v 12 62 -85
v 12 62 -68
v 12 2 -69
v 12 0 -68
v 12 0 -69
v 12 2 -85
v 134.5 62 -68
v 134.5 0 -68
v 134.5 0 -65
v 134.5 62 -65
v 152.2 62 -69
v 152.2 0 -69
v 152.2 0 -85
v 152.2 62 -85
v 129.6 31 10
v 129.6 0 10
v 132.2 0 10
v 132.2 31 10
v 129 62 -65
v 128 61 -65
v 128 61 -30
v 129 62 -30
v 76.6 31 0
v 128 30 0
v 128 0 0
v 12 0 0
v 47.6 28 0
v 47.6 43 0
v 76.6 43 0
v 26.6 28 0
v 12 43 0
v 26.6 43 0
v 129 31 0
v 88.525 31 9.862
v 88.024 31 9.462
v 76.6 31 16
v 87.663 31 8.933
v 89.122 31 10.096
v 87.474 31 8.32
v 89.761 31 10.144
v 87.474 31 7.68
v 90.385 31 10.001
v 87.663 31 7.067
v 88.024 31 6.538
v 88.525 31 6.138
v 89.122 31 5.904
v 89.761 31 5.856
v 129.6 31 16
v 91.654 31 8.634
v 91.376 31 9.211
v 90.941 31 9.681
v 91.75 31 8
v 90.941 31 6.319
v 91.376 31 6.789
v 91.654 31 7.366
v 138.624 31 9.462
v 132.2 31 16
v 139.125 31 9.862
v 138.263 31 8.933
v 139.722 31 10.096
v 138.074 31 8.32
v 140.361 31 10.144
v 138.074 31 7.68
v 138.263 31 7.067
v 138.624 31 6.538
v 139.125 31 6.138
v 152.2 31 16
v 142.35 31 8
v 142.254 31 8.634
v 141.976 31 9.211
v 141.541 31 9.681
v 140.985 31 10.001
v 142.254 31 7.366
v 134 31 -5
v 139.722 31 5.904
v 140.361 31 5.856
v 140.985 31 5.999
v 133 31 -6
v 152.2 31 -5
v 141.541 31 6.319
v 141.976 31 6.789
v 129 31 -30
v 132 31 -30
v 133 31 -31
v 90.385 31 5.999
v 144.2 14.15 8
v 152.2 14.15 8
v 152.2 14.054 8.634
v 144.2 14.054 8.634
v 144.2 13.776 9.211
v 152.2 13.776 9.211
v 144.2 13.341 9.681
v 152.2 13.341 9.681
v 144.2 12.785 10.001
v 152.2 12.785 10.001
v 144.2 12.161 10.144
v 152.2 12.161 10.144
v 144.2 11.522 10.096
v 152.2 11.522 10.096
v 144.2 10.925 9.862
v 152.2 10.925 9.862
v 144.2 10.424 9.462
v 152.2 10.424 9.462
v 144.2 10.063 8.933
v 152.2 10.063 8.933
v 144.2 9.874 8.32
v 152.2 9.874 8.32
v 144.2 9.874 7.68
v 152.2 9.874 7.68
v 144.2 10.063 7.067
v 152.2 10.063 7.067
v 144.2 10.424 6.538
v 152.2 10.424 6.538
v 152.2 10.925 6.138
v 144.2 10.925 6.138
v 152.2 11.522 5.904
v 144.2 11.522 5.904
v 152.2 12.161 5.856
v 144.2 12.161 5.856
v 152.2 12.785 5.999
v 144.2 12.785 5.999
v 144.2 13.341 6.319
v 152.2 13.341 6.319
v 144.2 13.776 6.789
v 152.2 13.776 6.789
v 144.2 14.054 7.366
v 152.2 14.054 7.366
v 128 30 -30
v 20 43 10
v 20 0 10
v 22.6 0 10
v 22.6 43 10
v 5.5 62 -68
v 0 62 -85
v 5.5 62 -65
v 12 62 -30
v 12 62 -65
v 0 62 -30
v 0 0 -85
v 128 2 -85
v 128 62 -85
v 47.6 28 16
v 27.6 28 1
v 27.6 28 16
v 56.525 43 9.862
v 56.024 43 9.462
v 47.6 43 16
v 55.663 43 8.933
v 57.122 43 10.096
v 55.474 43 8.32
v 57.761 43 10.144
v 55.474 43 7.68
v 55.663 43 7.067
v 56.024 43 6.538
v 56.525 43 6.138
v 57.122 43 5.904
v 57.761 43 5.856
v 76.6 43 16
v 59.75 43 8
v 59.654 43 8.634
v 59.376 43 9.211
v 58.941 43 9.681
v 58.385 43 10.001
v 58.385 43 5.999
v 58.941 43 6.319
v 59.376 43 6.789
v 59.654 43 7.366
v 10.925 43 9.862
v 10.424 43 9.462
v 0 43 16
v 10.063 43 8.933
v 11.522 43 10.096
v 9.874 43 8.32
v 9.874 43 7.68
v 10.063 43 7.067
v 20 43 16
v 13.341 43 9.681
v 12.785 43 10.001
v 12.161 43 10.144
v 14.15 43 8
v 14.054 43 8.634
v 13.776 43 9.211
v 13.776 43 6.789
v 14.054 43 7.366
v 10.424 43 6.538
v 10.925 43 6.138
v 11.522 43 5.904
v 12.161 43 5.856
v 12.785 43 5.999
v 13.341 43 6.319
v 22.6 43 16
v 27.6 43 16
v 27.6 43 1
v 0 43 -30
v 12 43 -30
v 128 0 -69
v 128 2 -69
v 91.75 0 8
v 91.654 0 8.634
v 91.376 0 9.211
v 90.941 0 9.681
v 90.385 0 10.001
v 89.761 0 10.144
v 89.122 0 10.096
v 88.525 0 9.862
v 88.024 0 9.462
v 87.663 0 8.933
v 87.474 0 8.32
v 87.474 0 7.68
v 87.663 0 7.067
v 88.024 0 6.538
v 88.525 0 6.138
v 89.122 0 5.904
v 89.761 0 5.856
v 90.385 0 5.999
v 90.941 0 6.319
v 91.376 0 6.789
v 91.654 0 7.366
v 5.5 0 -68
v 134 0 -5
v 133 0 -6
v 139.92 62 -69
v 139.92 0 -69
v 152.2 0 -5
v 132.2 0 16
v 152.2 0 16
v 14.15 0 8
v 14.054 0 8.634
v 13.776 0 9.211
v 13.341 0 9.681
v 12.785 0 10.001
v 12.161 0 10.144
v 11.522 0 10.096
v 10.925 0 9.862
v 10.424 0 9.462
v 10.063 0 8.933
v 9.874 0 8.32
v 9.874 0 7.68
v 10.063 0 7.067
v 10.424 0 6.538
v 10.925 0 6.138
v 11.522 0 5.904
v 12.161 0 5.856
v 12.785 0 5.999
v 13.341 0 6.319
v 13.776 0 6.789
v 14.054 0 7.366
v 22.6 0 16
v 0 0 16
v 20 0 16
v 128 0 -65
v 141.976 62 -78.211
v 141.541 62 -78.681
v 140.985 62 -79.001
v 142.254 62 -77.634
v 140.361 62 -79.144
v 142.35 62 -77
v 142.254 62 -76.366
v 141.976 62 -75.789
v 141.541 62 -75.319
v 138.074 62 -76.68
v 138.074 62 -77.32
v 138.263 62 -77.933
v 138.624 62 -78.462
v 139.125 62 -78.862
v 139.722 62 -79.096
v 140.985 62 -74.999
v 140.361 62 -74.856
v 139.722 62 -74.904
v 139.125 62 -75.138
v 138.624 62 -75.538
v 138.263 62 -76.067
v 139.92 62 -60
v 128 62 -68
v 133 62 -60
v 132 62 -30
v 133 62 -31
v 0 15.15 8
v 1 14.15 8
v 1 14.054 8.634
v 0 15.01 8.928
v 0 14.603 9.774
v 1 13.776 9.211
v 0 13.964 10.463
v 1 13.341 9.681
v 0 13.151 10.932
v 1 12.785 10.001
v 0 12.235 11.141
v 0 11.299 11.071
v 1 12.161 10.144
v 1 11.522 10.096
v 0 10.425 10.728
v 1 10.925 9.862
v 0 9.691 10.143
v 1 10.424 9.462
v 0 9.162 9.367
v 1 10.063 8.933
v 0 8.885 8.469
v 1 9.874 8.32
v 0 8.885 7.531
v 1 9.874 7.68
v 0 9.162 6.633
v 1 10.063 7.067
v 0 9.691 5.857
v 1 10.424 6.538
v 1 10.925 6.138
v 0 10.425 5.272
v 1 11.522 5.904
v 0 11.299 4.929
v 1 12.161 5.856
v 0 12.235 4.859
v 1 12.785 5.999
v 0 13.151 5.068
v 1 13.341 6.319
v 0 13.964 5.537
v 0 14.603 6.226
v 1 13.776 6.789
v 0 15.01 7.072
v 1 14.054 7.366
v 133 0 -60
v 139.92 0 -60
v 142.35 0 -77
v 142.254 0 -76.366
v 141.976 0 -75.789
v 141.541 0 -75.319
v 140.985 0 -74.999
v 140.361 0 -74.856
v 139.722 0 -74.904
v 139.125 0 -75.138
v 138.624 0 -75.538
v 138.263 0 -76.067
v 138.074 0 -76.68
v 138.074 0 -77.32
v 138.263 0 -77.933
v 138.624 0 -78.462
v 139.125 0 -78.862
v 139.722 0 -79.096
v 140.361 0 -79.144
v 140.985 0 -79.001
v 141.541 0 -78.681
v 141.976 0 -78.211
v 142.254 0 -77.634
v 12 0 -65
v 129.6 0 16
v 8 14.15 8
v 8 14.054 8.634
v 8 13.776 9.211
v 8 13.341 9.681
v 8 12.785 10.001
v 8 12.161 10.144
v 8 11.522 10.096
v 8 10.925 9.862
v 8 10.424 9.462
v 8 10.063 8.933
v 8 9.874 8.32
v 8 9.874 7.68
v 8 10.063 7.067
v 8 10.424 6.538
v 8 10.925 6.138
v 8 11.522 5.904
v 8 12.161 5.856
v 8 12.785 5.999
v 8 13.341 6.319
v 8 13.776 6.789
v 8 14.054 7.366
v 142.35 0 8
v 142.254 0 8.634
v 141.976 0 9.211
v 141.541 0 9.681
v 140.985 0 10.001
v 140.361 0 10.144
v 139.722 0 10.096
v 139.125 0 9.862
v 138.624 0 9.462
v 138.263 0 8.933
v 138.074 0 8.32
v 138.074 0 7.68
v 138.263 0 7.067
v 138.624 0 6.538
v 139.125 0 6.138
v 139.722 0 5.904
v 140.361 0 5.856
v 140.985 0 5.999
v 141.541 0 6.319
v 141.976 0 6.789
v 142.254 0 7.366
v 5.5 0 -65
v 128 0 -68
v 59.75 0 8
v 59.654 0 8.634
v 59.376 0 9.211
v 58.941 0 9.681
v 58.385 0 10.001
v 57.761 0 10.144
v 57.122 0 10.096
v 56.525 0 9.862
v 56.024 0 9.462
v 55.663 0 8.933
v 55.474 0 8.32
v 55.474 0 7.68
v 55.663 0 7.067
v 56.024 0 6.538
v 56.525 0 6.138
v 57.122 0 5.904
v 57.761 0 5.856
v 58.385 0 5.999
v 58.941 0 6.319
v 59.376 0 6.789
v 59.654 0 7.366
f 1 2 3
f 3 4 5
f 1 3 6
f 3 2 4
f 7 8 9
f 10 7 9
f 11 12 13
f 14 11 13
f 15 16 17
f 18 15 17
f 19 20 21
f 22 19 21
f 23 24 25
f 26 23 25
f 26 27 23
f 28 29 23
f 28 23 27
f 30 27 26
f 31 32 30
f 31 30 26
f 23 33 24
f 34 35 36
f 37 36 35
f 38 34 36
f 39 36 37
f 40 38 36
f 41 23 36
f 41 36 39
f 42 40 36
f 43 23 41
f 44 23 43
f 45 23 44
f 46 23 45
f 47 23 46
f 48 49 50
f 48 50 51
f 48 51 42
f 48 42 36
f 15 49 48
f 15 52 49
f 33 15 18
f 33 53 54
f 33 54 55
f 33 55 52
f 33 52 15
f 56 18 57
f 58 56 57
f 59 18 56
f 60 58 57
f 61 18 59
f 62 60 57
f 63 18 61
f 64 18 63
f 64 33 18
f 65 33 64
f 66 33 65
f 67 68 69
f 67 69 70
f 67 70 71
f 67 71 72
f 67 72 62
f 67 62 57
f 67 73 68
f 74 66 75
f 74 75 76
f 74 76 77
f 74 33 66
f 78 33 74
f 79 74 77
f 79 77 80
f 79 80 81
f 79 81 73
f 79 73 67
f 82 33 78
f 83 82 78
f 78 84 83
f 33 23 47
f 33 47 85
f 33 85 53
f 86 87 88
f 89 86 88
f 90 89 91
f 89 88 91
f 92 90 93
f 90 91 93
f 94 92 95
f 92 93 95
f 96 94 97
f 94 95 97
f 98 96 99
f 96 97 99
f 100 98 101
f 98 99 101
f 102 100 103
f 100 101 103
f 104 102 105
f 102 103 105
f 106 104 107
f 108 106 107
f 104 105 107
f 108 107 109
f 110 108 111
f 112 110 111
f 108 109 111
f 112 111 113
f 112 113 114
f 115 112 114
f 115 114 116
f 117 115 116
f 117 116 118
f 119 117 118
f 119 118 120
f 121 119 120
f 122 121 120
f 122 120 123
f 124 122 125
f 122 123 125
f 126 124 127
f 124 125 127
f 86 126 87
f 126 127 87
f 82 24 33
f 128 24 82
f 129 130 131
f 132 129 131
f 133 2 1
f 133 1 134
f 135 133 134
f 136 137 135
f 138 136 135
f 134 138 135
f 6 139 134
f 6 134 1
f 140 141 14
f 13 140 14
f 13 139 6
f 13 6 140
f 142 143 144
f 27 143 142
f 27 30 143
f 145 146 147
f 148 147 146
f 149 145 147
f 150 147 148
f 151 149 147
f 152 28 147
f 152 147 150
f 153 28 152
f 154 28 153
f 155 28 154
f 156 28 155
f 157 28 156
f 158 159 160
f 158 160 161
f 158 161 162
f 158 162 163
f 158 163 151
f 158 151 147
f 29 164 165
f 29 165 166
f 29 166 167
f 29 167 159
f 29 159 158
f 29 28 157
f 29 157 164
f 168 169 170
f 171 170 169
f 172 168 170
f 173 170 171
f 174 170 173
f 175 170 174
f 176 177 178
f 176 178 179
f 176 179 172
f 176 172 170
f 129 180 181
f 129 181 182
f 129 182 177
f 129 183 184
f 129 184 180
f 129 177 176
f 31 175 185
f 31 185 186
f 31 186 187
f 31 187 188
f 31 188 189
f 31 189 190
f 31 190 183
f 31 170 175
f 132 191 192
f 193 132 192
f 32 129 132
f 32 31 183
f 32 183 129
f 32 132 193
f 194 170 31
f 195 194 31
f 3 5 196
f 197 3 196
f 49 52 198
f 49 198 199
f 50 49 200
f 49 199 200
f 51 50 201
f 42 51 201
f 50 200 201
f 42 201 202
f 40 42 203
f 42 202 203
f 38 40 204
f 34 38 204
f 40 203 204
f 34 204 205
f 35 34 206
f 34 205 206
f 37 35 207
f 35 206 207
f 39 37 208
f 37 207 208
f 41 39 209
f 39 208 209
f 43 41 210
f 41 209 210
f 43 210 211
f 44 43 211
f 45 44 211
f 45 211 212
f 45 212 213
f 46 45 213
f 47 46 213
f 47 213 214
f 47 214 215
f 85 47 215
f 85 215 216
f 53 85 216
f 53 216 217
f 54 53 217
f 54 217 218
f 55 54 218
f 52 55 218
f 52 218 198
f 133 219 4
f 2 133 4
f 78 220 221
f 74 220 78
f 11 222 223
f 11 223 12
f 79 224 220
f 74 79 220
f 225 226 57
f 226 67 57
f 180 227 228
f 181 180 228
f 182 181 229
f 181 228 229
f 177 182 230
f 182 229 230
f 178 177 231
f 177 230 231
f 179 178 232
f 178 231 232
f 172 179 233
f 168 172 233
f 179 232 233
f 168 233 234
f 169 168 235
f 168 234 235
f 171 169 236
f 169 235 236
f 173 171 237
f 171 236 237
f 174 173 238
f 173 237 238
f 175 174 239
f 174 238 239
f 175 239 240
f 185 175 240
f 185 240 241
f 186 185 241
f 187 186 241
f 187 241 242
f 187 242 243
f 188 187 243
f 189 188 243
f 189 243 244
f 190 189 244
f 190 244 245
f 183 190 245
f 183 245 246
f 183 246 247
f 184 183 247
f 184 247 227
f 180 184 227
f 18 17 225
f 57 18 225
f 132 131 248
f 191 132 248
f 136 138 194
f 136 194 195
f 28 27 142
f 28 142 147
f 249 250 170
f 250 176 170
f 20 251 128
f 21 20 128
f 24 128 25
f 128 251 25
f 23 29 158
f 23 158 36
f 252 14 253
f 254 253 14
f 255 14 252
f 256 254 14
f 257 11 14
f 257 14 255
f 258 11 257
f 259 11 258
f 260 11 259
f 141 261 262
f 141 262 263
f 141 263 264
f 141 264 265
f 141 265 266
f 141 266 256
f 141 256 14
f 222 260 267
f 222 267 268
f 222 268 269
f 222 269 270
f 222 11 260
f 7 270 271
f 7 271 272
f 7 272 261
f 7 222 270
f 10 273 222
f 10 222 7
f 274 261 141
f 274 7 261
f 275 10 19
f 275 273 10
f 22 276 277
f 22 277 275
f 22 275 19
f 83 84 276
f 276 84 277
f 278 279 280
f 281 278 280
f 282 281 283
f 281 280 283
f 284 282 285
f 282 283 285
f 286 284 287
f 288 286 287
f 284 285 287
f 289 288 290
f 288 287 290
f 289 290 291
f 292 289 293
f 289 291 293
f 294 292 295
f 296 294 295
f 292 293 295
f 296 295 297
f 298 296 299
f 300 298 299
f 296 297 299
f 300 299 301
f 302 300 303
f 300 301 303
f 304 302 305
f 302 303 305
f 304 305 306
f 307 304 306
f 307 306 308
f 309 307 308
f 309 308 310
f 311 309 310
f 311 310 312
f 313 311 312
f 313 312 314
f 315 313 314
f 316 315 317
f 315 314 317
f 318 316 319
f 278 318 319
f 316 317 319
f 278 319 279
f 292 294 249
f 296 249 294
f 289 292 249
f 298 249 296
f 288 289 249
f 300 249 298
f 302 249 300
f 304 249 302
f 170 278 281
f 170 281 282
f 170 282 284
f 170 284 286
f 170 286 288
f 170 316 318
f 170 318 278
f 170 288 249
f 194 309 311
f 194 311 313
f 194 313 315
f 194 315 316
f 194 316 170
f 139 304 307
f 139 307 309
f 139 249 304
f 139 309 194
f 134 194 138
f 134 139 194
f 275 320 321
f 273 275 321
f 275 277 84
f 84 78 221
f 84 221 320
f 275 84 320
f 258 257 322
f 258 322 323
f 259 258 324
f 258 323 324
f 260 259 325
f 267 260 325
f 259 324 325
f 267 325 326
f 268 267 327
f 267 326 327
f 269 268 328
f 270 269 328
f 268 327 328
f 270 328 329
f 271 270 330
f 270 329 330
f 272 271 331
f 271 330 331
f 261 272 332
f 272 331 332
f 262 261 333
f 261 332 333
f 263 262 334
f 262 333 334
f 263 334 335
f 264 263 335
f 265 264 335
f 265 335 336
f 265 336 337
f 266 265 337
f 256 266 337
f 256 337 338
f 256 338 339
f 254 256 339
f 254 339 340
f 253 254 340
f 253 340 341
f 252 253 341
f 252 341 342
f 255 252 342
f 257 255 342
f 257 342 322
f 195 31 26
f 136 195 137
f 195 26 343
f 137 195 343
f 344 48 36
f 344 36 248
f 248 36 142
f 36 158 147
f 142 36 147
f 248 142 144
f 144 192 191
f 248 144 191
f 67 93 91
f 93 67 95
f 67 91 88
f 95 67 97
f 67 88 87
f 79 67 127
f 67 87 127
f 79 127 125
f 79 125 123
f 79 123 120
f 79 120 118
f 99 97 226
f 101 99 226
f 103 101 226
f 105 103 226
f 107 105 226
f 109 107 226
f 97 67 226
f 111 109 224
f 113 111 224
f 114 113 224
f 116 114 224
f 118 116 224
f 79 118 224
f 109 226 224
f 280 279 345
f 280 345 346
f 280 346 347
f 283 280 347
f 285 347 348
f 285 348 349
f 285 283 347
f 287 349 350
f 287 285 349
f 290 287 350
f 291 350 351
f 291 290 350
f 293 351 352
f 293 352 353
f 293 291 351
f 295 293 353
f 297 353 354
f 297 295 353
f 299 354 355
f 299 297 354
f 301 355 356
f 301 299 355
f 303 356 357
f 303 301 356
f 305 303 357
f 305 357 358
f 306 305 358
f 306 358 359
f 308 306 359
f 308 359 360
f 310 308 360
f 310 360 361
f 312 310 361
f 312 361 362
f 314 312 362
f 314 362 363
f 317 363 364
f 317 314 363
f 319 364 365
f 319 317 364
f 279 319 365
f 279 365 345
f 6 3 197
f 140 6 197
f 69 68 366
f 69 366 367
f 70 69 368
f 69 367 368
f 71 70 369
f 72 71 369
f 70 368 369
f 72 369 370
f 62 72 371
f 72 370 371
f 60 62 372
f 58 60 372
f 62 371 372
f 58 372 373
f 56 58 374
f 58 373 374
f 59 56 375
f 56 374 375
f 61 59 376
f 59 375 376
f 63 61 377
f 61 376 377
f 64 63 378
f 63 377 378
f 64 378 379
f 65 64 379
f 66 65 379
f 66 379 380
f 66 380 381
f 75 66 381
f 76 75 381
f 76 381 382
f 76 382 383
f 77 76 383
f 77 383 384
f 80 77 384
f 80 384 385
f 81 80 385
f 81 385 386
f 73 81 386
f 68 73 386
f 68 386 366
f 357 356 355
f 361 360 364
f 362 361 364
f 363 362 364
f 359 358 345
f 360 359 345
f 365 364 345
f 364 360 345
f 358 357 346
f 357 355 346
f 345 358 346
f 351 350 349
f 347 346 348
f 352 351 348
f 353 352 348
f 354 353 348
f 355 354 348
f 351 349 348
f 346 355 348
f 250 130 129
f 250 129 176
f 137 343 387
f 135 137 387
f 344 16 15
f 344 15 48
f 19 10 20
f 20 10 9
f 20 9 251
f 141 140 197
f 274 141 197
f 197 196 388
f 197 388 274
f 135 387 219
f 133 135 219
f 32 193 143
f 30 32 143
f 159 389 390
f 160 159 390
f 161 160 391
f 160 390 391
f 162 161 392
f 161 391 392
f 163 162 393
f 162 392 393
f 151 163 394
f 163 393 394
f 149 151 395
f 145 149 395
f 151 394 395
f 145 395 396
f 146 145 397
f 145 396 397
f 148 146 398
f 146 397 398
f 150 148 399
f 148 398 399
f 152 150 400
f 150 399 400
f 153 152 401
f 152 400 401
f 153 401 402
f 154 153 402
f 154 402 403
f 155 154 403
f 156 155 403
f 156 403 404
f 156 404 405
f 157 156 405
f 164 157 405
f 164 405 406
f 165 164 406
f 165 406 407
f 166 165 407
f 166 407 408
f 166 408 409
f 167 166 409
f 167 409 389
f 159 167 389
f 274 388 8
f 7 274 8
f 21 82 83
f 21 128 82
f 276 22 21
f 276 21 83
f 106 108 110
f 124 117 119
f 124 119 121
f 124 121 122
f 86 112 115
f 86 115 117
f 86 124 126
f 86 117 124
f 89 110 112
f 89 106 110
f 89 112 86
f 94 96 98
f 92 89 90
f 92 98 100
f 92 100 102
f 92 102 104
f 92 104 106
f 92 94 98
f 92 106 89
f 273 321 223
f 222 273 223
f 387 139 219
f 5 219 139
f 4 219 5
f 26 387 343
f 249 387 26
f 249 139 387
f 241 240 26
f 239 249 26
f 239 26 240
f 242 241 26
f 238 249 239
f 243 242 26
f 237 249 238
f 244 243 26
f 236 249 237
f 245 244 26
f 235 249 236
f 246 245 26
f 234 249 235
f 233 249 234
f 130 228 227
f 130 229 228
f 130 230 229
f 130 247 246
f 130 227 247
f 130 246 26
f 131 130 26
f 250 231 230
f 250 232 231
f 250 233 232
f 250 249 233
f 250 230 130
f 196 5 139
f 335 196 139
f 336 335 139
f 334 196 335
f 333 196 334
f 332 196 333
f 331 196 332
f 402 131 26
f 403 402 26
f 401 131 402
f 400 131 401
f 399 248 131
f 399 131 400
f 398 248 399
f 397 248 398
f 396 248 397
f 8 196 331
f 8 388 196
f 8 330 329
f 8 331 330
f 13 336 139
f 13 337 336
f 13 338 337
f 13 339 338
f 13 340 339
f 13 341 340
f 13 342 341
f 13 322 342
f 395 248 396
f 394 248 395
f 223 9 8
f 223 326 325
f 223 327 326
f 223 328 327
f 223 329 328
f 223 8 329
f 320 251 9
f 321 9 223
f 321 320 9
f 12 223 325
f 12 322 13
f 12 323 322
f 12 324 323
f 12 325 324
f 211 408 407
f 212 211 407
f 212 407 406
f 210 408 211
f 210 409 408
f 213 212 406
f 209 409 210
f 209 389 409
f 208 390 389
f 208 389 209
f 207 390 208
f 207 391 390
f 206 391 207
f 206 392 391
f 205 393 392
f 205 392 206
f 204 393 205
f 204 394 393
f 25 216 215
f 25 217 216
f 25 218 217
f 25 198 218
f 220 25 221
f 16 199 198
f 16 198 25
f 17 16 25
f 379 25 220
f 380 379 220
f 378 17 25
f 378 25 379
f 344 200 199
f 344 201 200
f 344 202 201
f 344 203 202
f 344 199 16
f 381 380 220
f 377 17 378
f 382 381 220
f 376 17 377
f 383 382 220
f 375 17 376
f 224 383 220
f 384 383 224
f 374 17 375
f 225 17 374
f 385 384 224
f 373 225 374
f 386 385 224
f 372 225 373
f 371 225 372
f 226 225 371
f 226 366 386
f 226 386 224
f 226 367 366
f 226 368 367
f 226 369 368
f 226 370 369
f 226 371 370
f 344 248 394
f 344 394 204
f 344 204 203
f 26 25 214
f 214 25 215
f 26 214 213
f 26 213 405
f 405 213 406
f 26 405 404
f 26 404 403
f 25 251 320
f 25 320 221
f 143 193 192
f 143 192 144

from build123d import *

# Parameters (mm, degrees)
PAD_DEPTH       = 16
SKETCH002_R     = 2.15
POCKET001_DEPTH = 8
SKETCH003_R     = 2.15
POCKET002_DEPTH = 8
PAD001_DEPTH    = 62
SKETCH005_W     = 723.80365
SKETCH005_H     = 658.353257
POCKET003_DEPTH = 30
CHAMFER_SIZE    = 1
SKETCH001_R     = 2.15
SKETCH001_W     = 2.6
SKETCH001_H     = 6
POCKET_DEPTH    = 62.001
SKETCH006_W     = 116
SKETCH006_H     = 16
PAD002_DEPTH    = 2


with BuildPart() as part:
    # Sketch → Pad (new body)
    with BuildSketch(Plane.XY):
        Polygon((0, 0), (0, 43), (27.6, 43), (27.6, 28), (47.6, 28), (47.6, 43), (76.6, 43), (76.6, 31), (152.2, 31), (152.2, 0), align=None)
    extrude(amount=PAD_DEPTH)

    # Sketch002 → Pocket001 (cut)
    with BuildSketch(Plane.YZ):
        with Locations((12, 8)):
            Circle(SKETCH002_R)
    extrude(amount=POCKET001_DEPTH, mode=Mode.SUBTRACT)

    # Sketch003 (on DatumPlane) → Pocket002 (cut)
    with BuildSketch(Plane.YZ.offset(152.2)):
        with Locations((12, 8)):
            Circle(SKETCH003_R)
    extrude(amount=-POCKET002_DEPTH, mode=Mode.SUBTRACT)

    # Sketch004 → Pad001 (join)
    with BuildSketch(Plane.XZ):
        Polygon((128, 0), (152.2, 0), (152.2, -5), (133, -5), (133, -60), (139.919662, -60), (139.919662, -69), (152.2, -69), (152.2, -85), (128, -85), (128, -68), (134.5, -68), (134.5, -65), (128, -65), align=None)
        Polygon((0, 0), (12, 0), (12, -65), (5.5, -65), (5.5, -68), (12, -68), (12, -85), (0, -85), (0, -65), align=None)
    extrude(amount=-PAD001_DEPTH)

    # Sketch005 → Pocket003 (cut)
    with BuildSketch(Plane.XY):
        with Locations((105.388489, 130.509316)):
            Rectangle(SKETCH005_W, SKETCH005_H)
        Polygon((0, 0), (0, 43), (76.6, 43), (76.6, 31), (152.2, 31), (152.2, 0), align=None, mode=Mode.SUBTRACT)
    extrude(amount=-POCKET003_DEPTH, mode=Mode.SUBTRACT)

    # Chamfer
    chamfer_edges = [part.edges().sort_by_distance(p)[0] for p in [
        (133, 46.5, -30),
        (133, 15.5, -5),
        (128, 31, -15),
        (128, 62, -47.5),
        (27.6, 35.5, 0),
        (0, 9.85, 8),
    ]]
    chamfer(chamfer_edges, length=CHAMFER_SIZE)

    # Sketch001 → Pocket (cut, through all)
    with BuildSketch(Plane.XZ):
        with Locations((12, 8)):
            Circle(SKETCH001_R)
        with Locations((89.6, 8)):
            Circle(SKETCH001_R)
        with Locations((140.2, 8)):
            Circle(SKETCH001_R)
        with Locations((57.6, 8)):
            Circle(SKETCH001_R)
        with Locations((140.2, -77)):
            Circle(SKETCH001_R)
        with Locations((21.3, 13)):
            Rectangle(SKETCH001_W, SKETCH001_H)
        with Locations((130.9, 13)):
            Rectangle(SKETCH001_W, SKETCH001_H)
    extrude(amount=-POCKET_DEPTH, mode=Mode.SUBTRACT)

    # Sketch006 → Pad002 (join)
    with BuildSketch(Plane.XZ):
        with Locations((70, -77)):
            Rectangle(SKETCH006_W, SKETCH006_H)
    extrude(amount=-PAD002_DEPTH)


solid = part.part
